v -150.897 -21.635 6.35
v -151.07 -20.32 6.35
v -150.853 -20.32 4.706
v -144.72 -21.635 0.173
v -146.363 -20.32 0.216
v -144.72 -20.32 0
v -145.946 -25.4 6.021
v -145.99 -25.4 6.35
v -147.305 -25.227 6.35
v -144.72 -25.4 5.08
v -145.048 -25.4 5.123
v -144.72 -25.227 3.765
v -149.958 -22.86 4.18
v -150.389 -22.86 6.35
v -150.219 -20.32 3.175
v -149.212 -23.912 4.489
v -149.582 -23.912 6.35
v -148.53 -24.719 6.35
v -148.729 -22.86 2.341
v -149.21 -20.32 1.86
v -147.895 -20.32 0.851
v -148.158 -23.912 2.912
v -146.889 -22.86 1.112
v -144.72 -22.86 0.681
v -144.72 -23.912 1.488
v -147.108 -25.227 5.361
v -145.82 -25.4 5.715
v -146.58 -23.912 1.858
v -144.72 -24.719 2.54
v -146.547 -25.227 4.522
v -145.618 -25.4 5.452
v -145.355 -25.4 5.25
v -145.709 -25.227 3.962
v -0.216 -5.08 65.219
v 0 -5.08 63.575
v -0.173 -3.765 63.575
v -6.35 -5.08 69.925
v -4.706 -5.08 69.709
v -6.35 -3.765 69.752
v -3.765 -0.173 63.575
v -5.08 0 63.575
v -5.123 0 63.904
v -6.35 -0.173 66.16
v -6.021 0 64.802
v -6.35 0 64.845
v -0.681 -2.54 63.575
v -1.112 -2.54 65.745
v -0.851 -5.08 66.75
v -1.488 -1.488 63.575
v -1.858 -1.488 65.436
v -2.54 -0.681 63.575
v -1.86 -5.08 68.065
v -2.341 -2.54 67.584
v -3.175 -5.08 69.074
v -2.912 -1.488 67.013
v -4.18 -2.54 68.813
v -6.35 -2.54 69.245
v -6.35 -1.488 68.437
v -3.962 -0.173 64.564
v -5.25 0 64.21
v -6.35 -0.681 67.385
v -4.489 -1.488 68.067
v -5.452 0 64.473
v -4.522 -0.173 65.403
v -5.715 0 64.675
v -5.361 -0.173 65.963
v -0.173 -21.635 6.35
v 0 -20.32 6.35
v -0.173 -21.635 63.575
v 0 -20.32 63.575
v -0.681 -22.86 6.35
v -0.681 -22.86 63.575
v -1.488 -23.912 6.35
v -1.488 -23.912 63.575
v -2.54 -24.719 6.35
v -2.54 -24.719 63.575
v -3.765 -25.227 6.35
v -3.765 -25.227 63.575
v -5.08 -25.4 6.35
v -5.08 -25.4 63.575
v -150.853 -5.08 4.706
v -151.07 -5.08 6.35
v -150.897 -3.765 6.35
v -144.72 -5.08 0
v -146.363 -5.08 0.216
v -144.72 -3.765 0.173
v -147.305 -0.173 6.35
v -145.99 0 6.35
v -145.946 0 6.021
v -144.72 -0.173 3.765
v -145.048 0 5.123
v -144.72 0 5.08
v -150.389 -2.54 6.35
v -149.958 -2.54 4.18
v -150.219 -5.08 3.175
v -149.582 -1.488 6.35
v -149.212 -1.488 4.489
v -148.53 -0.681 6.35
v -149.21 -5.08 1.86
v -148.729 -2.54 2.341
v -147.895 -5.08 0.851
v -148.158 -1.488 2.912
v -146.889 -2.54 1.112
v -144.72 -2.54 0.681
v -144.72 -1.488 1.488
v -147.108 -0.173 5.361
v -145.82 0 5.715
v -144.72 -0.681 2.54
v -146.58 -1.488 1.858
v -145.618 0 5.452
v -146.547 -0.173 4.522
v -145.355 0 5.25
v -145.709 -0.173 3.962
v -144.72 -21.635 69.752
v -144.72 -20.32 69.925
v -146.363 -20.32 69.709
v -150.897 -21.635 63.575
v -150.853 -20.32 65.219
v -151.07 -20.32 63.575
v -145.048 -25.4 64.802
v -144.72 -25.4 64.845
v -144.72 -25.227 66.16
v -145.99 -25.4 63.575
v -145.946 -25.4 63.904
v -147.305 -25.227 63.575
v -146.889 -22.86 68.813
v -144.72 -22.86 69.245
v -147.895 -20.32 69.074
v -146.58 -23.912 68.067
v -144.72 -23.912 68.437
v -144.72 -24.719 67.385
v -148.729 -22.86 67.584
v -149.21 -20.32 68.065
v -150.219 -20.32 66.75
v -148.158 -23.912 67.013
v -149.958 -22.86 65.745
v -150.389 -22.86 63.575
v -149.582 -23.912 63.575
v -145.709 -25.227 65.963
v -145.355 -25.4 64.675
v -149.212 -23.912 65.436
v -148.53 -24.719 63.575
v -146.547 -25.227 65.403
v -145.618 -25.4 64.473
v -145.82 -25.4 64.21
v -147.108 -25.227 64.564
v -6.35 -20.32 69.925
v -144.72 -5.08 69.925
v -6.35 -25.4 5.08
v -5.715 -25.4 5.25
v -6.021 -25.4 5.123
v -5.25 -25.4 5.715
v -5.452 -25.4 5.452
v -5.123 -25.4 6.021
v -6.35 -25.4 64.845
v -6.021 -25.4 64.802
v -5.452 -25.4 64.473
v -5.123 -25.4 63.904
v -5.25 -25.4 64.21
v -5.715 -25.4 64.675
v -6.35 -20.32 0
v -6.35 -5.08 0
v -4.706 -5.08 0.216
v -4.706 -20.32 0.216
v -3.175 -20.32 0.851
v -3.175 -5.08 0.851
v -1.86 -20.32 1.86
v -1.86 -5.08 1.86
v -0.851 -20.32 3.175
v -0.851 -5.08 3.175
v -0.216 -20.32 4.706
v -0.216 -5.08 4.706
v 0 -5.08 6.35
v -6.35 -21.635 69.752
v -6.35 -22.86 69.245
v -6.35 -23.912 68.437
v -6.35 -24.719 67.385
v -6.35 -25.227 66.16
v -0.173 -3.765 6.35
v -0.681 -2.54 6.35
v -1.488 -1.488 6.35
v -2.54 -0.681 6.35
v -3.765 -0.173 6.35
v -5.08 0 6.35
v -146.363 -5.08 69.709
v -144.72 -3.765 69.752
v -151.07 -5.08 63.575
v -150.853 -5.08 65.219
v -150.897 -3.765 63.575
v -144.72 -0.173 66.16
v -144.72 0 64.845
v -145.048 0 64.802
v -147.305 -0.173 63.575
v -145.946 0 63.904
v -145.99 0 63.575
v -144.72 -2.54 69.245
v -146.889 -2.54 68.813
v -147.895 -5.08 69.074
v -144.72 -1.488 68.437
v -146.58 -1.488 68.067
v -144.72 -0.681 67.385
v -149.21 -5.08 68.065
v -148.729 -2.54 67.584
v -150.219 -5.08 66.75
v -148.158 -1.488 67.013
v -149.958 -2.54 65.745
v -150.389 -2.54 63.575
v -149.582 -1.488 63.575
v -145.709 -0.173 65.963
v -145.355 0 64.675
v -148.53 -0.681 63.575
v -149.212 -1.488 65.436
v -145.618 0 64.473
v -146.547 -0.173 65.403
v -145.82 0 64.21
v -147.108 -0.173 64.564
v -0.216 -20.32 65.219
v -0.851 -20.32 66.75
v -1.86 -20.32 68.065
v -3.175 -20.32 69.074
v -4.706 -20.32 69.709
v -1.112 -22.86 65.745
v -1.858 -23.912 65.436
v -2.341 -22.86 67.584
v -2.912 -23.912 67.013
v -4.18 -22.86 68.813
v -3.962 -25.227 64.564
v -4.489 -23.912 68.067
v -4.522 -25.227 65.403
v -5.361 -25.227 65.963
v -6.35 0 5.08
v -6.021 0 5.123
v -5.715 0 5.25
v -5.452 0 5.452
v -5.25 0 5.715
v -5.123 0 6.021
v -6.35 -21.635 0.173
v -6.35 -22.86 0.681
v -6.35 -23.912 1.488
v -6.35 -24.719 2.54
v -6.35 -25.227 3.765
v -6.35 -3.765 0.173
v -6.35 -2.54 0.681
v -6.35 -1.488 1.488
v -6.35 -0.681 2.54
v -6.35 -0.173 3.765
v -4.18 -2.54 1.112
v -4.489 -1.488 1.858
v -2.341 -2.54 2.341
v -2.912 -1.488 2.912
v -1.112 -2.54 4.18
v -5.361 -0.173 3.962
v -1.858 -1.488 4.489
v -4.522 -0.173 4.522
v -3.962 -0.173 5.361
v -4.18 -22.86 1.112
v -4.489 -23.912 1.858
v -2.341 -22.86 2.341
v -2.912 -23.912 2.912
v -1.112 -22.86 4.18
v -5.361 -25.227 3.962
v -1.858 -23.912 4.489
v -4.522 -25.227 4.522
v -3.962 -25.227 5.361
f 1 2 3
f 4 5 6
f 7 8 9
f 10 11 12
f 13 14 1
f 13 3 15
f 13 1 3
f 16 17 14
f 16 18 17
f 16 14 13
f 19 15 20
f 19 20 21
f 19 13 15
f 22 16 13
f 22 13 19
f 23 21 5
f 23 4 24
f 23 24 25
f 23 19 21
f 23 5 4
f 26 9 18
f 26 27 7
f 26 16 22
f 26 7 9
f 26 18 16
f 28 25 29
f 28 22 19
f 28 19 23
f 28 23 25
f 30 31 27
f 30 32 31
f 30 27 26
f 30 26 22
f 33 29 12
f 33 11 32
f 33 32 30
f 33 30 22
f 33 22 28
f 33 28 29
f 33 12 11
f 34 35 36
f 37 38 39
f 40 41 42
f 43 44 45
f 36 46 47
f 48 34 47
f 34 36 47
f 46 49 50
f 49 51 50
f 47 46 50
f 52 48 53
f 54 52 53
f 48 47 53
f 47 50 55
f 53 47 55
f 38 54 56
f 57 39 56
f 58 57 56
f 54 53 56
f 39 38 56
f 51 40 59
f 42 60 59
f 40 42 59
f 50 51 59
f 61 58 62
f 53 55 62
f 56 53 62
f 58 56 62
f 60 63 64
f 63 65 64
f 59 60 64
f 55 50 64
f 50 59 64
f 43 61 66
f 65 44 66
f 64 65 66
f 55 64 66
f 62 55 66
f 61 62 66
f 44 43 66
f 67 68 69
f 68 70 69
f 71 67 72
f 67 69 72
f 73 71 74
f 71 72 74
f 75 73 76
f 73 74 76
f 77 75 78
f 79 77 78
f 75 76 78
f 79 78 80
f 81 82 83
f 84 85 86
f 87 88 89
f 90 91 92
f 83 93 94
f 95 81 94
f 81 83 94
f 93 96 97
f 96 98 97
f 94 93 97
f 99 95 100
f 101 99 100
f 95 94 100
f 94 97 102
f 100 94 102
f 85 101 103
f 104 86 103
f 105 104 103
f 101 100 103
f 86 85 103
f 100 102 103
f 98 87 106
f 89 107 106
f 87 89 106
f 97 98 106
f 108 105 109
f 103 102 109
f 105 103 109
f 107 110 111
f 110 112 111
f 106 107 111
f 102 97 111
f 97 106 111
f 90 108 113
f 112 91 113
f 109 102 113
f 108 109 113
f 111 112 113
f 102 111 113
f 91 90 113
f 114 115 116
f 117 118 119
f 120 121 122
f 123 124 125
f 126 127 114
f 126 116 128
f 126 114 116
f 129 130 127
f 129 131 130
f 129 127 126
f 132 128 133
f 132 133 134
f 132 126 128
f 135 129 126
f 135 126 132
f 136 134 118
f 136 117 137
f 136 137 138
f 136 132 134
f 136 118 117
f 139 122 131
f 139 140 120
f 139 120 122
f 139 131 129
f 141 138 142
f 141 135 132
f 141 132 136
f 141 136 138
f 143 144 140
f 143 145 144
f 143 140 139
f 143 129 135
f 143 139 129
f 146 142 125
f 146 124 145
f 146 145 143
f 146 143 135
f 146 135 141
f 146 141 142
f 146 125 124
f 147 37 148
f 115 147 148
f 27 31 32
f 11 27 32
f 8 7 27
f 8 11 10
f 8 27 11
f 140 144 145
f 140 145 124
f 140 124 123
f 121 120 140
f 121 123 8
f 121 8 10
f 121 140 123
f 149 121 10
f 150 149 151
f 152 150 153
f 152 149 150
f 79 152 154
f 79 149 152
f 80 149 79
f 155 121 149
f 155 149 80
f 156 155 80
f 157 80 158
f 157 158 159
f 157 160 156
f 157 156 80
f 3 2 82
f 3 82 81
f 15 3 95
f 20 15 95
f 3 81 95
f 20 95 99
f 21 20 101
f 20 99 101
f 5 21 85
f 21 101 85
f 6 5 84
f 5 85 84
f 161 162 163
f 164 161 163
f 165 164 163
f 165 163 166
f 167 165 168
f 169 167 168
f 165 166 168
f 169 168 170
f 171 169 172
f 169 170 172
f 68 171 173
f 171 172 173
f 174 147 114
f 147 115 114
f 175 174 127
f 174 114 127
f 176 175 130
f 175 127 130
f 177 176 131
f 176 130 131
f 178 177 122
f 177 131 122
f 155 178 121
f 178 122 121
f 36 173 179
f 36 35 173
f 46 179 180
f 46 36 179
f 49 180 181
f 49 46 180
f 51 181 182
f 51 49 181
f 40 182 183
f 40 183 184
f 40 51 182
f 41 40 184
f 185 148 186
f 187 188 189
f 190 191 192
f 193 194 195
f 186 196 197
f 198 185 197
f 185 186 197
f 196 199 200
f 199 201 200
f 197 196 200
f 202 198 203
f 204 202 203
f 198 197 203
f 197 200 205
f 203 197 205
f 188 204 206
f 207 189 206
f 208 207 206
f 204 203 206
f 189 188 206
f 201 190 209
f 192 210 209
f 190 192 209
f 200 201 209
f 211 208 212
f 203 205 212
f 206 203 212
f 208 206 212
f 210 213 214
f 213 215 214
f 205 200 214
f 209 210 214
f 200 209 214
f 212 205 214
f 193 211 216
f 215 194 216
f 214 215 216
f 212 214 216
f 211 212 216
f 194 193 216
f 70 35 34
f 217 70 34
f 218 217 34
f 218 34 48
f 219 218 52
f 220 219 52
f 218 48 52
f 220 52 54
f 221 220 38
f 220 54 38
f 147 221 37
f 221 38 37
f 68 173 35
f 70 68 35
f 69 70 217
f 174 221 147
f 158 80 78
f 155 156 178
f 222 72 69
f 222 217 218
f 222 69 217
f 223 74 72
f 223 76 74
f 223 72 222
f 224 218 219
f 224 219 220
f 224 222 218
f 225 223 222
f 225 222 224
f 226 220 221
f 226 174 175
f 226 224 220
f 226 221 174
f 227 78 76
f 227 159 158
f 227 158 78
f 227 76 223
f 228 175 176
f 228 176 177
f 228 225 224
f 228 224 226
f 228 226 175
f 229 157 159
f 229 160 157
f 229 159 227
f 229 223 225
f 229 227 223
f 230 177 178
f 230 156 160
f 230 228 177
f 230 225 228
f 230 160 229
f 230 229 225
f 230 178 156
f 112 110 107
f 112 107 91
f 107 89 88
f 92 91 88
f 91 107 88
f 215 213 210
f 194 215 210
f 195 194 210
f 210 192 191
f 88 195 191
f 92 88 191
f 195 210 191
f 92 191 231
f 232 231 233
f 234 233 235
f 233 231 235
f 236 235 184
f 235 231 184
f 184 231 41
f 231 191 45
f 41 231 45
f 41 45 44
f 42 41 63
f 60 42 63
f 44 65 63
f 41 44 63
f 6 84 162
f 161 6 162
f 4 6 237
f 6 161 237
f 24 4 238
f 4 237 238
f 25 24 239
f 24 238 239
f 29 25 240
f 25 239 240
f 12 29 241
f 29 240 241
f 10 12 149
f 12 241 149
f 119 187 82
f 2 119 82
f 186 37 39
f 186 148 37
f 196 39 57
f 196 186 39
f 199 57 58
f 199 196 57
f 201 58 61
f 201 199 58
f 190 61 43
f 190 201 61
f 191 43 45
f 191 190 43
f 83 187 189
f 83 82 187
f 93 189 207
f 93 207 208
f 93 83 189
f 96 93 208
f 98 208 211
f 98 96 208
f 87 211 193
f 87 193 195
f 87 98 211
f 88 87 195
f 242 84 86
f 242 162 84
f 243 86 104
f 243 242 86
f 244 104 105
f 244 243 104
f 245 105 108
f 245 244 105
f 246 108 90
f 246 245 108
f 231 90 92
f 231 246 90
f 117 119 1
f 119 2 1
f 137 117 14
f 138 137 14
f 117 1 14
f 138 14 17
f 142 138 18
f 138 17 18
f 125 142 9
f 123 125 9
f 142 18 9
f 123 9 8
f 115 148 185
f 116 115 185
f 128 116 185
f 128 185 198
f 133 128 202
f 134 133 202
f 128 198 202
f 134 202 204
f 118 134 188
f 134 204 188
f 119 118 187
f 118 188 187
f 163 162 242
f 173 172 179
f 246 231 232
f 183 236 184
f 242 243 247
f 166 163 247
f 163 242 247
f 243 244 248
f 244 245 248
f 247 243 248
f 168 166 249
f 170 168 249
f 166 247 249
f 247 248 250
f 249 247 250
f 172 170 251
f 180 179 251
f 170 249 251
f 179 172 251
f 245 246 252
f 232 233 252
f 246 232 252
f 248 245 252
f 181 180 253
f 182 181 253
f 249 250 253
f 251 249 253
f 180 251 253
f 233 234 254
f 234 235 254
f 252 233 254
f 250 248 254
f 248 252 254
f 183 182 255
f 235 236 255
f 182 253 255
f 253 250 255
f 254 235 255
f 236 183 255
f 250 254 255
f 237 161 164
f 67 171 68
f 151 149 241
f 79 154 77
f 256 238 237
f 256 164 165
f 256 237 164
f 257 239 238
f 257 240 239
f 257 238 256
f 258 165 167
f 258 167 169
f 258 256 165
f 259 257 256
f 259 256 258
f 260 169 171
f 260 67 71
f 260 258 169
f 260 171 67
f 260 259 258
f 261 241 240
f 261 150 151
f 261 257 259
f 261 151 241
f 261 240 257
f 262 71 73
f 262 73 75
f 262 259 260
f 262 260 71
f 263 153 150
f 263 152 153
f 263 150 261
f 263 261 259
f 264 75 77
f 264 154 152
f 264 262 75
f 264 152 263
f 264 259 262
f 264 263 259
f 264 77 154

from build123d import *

# Parameters (mm, degrees)
F1_DEPTH = 25.4
F2_R     = 5.08


with BuildPart() as f1:
    # F0 (on Front) → F1 (new body)
    with BuildSketch(Plane.XZ):
        with BuildLine():
            Line((-144.719701, 0), (-6.35, 0))
            ThreePointArc((-6.35, 0), (-1.859872, 1.859872), (0, 6.35))
            Line((0, 6.35), (0, 63.575182))
            ThreePointArc((0, 63.575182), (-1.859872, 68.06531), (-6.35, 69.925182))
            Line((-6.35, 69.925182), (-144.719701, 69.925182))
            ThreePointArc((-144.719701, 69.925182), (-149.209829, 68.06531), (-151.069701, 63.575182))
            Line((-151.069701, 63.575182), (-151.069701, 6.35))
            ThreePointArc((-151.069701, 6.35), (-149.209829, 1.859872), (-144.719701, 0))
        make_face()
    extrude(amount=F1_DEPTH)

    # F2
    f2_edges = [f1.edges().sort_by_distance(p)[0] for p in [
        (-151.069701, 0, 34.962591),
        (-151.069701, -25.4, 34.962591),
    ]]
    fillet(f2_edges, radius=F2_R)


solid = f1.part
